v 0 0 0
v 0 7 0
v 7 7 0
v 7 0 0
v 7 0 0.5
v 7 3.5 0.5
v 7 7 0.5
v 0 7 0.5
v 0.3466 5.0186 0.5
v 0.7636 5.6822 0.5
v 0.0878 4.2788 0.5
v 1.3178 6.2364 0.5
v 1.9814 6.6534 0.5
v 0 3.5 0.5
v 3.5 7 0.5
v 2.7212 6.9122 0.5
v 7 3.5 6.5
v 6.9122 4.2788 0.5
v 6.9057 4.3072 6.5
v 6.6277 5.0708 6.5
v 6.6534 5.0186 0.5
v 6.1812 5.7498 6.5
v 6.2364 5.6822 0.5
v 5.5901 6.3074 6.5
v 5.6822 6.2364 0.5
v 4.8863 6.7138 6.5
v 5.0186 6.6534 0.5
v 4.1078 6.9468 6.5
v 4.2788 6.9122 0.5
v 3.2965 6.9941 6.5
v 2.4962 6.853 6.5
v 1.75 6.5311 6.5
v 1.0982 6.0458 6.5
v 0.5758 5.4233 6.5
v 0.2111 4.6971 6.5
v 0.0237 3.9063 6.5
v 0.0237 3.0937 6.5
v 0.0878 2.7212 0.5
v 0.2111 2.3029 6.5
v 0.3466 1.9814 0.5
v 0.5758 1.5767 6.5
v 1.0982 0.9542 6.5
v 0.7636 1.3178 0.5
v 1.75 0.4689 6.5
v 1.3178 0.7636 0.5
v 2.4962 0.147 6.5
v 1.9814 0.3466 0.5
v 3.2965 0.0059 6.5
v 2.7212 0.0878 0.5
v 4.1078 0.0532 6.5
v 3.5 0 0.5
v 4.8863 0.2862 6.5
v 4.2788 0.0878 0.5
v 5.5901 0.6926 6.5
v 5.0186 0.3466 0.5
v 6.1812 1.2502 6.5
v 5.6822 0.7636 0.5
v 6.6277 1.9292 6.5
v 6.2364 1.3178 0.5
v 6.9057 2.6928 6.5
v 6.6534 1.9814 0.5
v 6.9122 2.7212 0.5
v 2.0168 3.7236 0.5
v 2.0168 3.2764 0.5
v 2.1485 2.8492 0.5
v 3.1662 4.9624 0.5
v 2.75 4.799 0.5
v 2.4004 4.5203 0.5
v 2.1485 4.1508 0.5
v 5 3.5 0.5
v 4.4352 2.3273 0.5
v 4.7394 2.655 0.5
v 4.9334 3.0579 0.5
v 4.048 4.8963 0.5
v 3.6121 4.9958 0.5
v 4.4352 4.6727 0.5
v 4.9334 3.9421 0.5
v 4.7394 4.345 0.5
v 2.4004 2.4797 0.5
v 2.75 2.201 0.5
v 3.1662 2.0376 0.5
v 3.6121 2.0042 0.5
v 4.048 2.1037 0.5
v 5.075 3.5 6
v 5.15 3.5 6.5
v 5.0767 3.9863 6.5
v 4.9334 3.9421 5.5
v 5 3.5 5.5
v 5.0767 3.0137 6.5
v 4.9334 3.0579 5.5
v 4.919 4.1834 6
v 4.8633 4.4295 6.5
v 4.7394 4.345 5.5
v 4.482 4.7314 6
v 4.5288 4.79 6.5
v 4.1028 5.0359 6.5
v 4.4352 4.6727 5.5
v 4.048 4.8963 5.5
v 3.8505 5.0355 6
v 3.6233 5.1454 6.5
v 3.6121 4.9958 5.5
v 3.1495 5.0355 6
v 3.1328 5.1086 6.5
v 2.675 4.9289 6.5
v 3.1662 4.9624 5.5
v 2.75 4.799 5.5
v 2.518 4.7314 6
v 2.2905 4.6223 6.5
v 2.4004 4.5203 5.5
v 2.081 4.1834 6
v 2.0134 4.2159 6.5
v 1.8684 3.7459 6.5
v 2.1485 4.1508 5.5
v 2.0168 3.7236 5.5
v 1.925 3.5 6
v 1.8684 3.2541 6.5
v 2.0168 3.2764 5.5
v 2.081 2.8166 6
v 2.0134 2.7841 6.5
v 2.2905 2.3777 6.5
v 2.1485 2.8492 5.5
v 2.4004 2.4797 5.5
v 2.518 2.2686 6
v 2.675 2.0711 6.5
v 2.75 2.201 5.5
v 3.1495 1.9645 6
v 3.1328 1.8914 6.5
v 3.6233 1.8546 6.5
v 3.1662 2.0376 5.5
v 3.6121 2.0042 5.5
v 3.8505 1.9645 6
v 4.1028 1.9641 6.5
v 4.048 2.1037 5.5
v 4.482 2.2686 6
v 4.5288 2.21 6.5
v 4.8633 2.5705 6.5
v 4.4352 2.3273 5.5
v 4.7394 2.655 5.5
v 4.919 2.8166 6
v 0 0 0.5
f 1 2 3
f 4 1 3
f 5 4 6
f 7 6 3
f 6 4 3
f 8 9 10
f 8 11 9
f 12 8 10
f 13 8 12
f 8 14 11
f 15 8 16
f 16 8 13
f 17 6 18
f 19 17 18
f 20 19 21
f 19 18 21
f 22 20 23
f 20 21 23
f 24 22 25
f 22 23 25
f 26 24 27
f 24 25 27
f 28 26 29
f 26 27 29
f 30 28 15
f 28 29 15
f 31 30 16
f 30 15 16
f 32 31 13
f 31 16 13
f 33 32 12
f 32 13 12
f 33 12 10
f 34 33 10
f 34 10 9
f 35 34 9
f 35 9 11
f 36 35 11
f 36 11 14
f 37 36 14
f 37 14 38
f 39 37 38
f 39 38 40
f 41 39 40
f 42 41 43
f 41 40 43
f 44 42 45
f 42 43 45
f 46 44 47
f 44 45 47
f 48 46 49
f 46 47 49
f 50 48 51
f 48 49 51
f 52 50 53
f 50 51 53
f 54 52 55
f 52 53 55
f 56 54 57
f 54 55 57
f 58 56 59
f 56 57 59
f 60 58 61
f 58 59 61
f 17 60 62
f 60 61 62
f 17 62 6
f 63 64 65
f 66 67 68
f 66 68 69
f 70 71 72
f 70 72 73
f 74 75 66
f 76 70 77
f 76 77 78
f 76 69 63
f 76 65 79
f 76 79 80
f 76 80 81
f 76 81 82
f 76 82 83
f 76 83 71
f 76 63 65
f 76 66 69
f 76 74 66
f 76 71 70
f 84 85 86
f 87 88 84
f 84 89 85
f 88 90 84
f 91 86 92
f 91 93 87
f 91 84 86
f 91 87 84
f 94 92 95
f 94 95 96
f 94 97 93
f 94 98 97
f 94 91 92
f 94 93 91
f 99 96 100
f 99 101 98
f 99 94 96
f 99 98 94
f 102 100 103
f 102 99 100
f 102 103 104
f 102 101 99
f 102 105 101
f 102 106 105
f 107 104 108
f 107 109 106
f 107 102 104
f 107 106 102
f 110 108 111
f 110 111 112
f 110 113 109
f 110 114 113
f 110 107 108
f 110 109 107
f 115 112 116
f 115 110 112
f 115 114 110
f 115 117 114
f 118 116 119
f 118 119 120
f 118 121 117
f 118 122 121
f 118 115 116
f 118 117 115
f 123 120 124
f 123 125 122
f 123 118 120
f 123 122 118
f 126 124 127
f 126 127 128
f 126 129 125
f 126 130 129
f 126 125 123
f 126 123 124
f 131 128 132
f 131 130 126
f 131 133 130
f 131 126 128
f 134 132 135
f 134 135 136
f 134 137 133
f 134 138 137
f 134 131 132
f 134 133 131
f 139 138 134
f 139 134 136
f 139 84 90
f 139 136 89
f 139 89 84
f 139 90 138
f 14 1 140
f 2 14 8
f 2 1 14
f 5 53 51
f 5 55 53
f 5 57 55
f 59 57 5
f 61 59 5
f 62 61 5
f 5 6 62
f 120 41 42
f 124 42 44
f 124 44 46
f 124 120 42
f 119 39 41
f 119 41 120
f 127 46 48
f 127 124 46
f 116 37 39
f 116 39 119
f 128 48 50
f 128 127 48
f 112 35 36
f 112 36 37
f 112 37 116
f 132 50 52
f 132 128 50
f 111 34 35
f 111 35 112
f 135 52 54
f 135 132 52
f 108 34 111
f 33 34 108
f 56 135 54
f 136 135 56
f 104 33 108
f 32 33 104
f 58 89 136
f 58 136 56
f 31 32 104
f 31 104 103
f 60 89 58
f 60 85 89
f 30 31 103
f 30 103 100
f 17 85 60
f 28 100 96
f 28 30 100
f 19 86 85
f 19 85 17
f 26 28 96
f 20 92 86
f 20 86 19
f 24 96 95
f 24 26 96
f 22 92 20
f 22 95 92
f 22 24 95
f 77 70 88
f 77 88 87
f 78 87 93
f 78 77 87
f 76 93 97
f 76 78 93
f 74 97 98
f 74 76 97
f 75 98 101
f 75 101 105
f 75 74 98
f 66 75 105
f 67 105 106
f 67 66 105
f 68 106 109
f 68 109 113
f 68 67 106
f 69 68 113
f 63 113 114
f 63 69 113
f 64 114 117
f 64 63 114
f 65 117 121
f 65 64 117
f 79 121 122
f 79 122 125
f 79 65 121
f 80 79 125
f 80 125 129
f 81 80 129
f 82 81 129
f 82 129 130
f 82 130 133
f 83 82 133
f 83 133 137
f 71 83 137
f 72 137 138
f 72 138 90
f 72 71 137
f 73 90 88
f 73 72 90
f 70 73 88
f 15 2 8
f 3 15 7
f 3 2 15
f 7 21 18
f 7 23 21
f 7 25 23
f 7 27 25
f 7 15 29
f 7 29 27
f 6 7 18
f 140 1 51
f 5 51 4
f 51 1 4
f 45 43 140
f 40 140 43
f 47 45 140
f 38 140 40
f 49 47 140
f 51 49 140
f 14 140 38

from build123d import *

# Parameters (mm, degrees)
F0_W     = 7
F0_H     = 7
F1_DEPTH = 0.5
F2_R     = 3.5
F2_R_2   = 1.5
F3_DEPTH = 6
F4_SIZE2 = 1
F4_SIZE  = 0.15


with BuildPart() as f1:
    # F0 (on Top) → F1 (new body)
    with BuildSketch(Plane.XY):
        with Locations((3.5, 3.5)):
            Rectangle(F0_W, F0_H)
    extrude(amount=F1_DEPTH)

    # F2 (on face) → F3 (join)
    with BuildSketch(Plane.XY.offset(0.5)):
        with Locations((3.5, 3.5)):
            Circle(F2_R)
        with Locations((3.5, 3.5)):
            Circle(F2_R_2, mode=Mode.SUBTRACT)
    extrude(amount=F3_DEPTH)

    # F4
    f4_edges = [f1.edges().sort_by_distance(p)[0] for p in [
        (2, 3.5, 6.5),
    ]]
    chamfer(f4_edges, length=F4_SIZE, length2=F4_SIZE2)


solid = f1.part
